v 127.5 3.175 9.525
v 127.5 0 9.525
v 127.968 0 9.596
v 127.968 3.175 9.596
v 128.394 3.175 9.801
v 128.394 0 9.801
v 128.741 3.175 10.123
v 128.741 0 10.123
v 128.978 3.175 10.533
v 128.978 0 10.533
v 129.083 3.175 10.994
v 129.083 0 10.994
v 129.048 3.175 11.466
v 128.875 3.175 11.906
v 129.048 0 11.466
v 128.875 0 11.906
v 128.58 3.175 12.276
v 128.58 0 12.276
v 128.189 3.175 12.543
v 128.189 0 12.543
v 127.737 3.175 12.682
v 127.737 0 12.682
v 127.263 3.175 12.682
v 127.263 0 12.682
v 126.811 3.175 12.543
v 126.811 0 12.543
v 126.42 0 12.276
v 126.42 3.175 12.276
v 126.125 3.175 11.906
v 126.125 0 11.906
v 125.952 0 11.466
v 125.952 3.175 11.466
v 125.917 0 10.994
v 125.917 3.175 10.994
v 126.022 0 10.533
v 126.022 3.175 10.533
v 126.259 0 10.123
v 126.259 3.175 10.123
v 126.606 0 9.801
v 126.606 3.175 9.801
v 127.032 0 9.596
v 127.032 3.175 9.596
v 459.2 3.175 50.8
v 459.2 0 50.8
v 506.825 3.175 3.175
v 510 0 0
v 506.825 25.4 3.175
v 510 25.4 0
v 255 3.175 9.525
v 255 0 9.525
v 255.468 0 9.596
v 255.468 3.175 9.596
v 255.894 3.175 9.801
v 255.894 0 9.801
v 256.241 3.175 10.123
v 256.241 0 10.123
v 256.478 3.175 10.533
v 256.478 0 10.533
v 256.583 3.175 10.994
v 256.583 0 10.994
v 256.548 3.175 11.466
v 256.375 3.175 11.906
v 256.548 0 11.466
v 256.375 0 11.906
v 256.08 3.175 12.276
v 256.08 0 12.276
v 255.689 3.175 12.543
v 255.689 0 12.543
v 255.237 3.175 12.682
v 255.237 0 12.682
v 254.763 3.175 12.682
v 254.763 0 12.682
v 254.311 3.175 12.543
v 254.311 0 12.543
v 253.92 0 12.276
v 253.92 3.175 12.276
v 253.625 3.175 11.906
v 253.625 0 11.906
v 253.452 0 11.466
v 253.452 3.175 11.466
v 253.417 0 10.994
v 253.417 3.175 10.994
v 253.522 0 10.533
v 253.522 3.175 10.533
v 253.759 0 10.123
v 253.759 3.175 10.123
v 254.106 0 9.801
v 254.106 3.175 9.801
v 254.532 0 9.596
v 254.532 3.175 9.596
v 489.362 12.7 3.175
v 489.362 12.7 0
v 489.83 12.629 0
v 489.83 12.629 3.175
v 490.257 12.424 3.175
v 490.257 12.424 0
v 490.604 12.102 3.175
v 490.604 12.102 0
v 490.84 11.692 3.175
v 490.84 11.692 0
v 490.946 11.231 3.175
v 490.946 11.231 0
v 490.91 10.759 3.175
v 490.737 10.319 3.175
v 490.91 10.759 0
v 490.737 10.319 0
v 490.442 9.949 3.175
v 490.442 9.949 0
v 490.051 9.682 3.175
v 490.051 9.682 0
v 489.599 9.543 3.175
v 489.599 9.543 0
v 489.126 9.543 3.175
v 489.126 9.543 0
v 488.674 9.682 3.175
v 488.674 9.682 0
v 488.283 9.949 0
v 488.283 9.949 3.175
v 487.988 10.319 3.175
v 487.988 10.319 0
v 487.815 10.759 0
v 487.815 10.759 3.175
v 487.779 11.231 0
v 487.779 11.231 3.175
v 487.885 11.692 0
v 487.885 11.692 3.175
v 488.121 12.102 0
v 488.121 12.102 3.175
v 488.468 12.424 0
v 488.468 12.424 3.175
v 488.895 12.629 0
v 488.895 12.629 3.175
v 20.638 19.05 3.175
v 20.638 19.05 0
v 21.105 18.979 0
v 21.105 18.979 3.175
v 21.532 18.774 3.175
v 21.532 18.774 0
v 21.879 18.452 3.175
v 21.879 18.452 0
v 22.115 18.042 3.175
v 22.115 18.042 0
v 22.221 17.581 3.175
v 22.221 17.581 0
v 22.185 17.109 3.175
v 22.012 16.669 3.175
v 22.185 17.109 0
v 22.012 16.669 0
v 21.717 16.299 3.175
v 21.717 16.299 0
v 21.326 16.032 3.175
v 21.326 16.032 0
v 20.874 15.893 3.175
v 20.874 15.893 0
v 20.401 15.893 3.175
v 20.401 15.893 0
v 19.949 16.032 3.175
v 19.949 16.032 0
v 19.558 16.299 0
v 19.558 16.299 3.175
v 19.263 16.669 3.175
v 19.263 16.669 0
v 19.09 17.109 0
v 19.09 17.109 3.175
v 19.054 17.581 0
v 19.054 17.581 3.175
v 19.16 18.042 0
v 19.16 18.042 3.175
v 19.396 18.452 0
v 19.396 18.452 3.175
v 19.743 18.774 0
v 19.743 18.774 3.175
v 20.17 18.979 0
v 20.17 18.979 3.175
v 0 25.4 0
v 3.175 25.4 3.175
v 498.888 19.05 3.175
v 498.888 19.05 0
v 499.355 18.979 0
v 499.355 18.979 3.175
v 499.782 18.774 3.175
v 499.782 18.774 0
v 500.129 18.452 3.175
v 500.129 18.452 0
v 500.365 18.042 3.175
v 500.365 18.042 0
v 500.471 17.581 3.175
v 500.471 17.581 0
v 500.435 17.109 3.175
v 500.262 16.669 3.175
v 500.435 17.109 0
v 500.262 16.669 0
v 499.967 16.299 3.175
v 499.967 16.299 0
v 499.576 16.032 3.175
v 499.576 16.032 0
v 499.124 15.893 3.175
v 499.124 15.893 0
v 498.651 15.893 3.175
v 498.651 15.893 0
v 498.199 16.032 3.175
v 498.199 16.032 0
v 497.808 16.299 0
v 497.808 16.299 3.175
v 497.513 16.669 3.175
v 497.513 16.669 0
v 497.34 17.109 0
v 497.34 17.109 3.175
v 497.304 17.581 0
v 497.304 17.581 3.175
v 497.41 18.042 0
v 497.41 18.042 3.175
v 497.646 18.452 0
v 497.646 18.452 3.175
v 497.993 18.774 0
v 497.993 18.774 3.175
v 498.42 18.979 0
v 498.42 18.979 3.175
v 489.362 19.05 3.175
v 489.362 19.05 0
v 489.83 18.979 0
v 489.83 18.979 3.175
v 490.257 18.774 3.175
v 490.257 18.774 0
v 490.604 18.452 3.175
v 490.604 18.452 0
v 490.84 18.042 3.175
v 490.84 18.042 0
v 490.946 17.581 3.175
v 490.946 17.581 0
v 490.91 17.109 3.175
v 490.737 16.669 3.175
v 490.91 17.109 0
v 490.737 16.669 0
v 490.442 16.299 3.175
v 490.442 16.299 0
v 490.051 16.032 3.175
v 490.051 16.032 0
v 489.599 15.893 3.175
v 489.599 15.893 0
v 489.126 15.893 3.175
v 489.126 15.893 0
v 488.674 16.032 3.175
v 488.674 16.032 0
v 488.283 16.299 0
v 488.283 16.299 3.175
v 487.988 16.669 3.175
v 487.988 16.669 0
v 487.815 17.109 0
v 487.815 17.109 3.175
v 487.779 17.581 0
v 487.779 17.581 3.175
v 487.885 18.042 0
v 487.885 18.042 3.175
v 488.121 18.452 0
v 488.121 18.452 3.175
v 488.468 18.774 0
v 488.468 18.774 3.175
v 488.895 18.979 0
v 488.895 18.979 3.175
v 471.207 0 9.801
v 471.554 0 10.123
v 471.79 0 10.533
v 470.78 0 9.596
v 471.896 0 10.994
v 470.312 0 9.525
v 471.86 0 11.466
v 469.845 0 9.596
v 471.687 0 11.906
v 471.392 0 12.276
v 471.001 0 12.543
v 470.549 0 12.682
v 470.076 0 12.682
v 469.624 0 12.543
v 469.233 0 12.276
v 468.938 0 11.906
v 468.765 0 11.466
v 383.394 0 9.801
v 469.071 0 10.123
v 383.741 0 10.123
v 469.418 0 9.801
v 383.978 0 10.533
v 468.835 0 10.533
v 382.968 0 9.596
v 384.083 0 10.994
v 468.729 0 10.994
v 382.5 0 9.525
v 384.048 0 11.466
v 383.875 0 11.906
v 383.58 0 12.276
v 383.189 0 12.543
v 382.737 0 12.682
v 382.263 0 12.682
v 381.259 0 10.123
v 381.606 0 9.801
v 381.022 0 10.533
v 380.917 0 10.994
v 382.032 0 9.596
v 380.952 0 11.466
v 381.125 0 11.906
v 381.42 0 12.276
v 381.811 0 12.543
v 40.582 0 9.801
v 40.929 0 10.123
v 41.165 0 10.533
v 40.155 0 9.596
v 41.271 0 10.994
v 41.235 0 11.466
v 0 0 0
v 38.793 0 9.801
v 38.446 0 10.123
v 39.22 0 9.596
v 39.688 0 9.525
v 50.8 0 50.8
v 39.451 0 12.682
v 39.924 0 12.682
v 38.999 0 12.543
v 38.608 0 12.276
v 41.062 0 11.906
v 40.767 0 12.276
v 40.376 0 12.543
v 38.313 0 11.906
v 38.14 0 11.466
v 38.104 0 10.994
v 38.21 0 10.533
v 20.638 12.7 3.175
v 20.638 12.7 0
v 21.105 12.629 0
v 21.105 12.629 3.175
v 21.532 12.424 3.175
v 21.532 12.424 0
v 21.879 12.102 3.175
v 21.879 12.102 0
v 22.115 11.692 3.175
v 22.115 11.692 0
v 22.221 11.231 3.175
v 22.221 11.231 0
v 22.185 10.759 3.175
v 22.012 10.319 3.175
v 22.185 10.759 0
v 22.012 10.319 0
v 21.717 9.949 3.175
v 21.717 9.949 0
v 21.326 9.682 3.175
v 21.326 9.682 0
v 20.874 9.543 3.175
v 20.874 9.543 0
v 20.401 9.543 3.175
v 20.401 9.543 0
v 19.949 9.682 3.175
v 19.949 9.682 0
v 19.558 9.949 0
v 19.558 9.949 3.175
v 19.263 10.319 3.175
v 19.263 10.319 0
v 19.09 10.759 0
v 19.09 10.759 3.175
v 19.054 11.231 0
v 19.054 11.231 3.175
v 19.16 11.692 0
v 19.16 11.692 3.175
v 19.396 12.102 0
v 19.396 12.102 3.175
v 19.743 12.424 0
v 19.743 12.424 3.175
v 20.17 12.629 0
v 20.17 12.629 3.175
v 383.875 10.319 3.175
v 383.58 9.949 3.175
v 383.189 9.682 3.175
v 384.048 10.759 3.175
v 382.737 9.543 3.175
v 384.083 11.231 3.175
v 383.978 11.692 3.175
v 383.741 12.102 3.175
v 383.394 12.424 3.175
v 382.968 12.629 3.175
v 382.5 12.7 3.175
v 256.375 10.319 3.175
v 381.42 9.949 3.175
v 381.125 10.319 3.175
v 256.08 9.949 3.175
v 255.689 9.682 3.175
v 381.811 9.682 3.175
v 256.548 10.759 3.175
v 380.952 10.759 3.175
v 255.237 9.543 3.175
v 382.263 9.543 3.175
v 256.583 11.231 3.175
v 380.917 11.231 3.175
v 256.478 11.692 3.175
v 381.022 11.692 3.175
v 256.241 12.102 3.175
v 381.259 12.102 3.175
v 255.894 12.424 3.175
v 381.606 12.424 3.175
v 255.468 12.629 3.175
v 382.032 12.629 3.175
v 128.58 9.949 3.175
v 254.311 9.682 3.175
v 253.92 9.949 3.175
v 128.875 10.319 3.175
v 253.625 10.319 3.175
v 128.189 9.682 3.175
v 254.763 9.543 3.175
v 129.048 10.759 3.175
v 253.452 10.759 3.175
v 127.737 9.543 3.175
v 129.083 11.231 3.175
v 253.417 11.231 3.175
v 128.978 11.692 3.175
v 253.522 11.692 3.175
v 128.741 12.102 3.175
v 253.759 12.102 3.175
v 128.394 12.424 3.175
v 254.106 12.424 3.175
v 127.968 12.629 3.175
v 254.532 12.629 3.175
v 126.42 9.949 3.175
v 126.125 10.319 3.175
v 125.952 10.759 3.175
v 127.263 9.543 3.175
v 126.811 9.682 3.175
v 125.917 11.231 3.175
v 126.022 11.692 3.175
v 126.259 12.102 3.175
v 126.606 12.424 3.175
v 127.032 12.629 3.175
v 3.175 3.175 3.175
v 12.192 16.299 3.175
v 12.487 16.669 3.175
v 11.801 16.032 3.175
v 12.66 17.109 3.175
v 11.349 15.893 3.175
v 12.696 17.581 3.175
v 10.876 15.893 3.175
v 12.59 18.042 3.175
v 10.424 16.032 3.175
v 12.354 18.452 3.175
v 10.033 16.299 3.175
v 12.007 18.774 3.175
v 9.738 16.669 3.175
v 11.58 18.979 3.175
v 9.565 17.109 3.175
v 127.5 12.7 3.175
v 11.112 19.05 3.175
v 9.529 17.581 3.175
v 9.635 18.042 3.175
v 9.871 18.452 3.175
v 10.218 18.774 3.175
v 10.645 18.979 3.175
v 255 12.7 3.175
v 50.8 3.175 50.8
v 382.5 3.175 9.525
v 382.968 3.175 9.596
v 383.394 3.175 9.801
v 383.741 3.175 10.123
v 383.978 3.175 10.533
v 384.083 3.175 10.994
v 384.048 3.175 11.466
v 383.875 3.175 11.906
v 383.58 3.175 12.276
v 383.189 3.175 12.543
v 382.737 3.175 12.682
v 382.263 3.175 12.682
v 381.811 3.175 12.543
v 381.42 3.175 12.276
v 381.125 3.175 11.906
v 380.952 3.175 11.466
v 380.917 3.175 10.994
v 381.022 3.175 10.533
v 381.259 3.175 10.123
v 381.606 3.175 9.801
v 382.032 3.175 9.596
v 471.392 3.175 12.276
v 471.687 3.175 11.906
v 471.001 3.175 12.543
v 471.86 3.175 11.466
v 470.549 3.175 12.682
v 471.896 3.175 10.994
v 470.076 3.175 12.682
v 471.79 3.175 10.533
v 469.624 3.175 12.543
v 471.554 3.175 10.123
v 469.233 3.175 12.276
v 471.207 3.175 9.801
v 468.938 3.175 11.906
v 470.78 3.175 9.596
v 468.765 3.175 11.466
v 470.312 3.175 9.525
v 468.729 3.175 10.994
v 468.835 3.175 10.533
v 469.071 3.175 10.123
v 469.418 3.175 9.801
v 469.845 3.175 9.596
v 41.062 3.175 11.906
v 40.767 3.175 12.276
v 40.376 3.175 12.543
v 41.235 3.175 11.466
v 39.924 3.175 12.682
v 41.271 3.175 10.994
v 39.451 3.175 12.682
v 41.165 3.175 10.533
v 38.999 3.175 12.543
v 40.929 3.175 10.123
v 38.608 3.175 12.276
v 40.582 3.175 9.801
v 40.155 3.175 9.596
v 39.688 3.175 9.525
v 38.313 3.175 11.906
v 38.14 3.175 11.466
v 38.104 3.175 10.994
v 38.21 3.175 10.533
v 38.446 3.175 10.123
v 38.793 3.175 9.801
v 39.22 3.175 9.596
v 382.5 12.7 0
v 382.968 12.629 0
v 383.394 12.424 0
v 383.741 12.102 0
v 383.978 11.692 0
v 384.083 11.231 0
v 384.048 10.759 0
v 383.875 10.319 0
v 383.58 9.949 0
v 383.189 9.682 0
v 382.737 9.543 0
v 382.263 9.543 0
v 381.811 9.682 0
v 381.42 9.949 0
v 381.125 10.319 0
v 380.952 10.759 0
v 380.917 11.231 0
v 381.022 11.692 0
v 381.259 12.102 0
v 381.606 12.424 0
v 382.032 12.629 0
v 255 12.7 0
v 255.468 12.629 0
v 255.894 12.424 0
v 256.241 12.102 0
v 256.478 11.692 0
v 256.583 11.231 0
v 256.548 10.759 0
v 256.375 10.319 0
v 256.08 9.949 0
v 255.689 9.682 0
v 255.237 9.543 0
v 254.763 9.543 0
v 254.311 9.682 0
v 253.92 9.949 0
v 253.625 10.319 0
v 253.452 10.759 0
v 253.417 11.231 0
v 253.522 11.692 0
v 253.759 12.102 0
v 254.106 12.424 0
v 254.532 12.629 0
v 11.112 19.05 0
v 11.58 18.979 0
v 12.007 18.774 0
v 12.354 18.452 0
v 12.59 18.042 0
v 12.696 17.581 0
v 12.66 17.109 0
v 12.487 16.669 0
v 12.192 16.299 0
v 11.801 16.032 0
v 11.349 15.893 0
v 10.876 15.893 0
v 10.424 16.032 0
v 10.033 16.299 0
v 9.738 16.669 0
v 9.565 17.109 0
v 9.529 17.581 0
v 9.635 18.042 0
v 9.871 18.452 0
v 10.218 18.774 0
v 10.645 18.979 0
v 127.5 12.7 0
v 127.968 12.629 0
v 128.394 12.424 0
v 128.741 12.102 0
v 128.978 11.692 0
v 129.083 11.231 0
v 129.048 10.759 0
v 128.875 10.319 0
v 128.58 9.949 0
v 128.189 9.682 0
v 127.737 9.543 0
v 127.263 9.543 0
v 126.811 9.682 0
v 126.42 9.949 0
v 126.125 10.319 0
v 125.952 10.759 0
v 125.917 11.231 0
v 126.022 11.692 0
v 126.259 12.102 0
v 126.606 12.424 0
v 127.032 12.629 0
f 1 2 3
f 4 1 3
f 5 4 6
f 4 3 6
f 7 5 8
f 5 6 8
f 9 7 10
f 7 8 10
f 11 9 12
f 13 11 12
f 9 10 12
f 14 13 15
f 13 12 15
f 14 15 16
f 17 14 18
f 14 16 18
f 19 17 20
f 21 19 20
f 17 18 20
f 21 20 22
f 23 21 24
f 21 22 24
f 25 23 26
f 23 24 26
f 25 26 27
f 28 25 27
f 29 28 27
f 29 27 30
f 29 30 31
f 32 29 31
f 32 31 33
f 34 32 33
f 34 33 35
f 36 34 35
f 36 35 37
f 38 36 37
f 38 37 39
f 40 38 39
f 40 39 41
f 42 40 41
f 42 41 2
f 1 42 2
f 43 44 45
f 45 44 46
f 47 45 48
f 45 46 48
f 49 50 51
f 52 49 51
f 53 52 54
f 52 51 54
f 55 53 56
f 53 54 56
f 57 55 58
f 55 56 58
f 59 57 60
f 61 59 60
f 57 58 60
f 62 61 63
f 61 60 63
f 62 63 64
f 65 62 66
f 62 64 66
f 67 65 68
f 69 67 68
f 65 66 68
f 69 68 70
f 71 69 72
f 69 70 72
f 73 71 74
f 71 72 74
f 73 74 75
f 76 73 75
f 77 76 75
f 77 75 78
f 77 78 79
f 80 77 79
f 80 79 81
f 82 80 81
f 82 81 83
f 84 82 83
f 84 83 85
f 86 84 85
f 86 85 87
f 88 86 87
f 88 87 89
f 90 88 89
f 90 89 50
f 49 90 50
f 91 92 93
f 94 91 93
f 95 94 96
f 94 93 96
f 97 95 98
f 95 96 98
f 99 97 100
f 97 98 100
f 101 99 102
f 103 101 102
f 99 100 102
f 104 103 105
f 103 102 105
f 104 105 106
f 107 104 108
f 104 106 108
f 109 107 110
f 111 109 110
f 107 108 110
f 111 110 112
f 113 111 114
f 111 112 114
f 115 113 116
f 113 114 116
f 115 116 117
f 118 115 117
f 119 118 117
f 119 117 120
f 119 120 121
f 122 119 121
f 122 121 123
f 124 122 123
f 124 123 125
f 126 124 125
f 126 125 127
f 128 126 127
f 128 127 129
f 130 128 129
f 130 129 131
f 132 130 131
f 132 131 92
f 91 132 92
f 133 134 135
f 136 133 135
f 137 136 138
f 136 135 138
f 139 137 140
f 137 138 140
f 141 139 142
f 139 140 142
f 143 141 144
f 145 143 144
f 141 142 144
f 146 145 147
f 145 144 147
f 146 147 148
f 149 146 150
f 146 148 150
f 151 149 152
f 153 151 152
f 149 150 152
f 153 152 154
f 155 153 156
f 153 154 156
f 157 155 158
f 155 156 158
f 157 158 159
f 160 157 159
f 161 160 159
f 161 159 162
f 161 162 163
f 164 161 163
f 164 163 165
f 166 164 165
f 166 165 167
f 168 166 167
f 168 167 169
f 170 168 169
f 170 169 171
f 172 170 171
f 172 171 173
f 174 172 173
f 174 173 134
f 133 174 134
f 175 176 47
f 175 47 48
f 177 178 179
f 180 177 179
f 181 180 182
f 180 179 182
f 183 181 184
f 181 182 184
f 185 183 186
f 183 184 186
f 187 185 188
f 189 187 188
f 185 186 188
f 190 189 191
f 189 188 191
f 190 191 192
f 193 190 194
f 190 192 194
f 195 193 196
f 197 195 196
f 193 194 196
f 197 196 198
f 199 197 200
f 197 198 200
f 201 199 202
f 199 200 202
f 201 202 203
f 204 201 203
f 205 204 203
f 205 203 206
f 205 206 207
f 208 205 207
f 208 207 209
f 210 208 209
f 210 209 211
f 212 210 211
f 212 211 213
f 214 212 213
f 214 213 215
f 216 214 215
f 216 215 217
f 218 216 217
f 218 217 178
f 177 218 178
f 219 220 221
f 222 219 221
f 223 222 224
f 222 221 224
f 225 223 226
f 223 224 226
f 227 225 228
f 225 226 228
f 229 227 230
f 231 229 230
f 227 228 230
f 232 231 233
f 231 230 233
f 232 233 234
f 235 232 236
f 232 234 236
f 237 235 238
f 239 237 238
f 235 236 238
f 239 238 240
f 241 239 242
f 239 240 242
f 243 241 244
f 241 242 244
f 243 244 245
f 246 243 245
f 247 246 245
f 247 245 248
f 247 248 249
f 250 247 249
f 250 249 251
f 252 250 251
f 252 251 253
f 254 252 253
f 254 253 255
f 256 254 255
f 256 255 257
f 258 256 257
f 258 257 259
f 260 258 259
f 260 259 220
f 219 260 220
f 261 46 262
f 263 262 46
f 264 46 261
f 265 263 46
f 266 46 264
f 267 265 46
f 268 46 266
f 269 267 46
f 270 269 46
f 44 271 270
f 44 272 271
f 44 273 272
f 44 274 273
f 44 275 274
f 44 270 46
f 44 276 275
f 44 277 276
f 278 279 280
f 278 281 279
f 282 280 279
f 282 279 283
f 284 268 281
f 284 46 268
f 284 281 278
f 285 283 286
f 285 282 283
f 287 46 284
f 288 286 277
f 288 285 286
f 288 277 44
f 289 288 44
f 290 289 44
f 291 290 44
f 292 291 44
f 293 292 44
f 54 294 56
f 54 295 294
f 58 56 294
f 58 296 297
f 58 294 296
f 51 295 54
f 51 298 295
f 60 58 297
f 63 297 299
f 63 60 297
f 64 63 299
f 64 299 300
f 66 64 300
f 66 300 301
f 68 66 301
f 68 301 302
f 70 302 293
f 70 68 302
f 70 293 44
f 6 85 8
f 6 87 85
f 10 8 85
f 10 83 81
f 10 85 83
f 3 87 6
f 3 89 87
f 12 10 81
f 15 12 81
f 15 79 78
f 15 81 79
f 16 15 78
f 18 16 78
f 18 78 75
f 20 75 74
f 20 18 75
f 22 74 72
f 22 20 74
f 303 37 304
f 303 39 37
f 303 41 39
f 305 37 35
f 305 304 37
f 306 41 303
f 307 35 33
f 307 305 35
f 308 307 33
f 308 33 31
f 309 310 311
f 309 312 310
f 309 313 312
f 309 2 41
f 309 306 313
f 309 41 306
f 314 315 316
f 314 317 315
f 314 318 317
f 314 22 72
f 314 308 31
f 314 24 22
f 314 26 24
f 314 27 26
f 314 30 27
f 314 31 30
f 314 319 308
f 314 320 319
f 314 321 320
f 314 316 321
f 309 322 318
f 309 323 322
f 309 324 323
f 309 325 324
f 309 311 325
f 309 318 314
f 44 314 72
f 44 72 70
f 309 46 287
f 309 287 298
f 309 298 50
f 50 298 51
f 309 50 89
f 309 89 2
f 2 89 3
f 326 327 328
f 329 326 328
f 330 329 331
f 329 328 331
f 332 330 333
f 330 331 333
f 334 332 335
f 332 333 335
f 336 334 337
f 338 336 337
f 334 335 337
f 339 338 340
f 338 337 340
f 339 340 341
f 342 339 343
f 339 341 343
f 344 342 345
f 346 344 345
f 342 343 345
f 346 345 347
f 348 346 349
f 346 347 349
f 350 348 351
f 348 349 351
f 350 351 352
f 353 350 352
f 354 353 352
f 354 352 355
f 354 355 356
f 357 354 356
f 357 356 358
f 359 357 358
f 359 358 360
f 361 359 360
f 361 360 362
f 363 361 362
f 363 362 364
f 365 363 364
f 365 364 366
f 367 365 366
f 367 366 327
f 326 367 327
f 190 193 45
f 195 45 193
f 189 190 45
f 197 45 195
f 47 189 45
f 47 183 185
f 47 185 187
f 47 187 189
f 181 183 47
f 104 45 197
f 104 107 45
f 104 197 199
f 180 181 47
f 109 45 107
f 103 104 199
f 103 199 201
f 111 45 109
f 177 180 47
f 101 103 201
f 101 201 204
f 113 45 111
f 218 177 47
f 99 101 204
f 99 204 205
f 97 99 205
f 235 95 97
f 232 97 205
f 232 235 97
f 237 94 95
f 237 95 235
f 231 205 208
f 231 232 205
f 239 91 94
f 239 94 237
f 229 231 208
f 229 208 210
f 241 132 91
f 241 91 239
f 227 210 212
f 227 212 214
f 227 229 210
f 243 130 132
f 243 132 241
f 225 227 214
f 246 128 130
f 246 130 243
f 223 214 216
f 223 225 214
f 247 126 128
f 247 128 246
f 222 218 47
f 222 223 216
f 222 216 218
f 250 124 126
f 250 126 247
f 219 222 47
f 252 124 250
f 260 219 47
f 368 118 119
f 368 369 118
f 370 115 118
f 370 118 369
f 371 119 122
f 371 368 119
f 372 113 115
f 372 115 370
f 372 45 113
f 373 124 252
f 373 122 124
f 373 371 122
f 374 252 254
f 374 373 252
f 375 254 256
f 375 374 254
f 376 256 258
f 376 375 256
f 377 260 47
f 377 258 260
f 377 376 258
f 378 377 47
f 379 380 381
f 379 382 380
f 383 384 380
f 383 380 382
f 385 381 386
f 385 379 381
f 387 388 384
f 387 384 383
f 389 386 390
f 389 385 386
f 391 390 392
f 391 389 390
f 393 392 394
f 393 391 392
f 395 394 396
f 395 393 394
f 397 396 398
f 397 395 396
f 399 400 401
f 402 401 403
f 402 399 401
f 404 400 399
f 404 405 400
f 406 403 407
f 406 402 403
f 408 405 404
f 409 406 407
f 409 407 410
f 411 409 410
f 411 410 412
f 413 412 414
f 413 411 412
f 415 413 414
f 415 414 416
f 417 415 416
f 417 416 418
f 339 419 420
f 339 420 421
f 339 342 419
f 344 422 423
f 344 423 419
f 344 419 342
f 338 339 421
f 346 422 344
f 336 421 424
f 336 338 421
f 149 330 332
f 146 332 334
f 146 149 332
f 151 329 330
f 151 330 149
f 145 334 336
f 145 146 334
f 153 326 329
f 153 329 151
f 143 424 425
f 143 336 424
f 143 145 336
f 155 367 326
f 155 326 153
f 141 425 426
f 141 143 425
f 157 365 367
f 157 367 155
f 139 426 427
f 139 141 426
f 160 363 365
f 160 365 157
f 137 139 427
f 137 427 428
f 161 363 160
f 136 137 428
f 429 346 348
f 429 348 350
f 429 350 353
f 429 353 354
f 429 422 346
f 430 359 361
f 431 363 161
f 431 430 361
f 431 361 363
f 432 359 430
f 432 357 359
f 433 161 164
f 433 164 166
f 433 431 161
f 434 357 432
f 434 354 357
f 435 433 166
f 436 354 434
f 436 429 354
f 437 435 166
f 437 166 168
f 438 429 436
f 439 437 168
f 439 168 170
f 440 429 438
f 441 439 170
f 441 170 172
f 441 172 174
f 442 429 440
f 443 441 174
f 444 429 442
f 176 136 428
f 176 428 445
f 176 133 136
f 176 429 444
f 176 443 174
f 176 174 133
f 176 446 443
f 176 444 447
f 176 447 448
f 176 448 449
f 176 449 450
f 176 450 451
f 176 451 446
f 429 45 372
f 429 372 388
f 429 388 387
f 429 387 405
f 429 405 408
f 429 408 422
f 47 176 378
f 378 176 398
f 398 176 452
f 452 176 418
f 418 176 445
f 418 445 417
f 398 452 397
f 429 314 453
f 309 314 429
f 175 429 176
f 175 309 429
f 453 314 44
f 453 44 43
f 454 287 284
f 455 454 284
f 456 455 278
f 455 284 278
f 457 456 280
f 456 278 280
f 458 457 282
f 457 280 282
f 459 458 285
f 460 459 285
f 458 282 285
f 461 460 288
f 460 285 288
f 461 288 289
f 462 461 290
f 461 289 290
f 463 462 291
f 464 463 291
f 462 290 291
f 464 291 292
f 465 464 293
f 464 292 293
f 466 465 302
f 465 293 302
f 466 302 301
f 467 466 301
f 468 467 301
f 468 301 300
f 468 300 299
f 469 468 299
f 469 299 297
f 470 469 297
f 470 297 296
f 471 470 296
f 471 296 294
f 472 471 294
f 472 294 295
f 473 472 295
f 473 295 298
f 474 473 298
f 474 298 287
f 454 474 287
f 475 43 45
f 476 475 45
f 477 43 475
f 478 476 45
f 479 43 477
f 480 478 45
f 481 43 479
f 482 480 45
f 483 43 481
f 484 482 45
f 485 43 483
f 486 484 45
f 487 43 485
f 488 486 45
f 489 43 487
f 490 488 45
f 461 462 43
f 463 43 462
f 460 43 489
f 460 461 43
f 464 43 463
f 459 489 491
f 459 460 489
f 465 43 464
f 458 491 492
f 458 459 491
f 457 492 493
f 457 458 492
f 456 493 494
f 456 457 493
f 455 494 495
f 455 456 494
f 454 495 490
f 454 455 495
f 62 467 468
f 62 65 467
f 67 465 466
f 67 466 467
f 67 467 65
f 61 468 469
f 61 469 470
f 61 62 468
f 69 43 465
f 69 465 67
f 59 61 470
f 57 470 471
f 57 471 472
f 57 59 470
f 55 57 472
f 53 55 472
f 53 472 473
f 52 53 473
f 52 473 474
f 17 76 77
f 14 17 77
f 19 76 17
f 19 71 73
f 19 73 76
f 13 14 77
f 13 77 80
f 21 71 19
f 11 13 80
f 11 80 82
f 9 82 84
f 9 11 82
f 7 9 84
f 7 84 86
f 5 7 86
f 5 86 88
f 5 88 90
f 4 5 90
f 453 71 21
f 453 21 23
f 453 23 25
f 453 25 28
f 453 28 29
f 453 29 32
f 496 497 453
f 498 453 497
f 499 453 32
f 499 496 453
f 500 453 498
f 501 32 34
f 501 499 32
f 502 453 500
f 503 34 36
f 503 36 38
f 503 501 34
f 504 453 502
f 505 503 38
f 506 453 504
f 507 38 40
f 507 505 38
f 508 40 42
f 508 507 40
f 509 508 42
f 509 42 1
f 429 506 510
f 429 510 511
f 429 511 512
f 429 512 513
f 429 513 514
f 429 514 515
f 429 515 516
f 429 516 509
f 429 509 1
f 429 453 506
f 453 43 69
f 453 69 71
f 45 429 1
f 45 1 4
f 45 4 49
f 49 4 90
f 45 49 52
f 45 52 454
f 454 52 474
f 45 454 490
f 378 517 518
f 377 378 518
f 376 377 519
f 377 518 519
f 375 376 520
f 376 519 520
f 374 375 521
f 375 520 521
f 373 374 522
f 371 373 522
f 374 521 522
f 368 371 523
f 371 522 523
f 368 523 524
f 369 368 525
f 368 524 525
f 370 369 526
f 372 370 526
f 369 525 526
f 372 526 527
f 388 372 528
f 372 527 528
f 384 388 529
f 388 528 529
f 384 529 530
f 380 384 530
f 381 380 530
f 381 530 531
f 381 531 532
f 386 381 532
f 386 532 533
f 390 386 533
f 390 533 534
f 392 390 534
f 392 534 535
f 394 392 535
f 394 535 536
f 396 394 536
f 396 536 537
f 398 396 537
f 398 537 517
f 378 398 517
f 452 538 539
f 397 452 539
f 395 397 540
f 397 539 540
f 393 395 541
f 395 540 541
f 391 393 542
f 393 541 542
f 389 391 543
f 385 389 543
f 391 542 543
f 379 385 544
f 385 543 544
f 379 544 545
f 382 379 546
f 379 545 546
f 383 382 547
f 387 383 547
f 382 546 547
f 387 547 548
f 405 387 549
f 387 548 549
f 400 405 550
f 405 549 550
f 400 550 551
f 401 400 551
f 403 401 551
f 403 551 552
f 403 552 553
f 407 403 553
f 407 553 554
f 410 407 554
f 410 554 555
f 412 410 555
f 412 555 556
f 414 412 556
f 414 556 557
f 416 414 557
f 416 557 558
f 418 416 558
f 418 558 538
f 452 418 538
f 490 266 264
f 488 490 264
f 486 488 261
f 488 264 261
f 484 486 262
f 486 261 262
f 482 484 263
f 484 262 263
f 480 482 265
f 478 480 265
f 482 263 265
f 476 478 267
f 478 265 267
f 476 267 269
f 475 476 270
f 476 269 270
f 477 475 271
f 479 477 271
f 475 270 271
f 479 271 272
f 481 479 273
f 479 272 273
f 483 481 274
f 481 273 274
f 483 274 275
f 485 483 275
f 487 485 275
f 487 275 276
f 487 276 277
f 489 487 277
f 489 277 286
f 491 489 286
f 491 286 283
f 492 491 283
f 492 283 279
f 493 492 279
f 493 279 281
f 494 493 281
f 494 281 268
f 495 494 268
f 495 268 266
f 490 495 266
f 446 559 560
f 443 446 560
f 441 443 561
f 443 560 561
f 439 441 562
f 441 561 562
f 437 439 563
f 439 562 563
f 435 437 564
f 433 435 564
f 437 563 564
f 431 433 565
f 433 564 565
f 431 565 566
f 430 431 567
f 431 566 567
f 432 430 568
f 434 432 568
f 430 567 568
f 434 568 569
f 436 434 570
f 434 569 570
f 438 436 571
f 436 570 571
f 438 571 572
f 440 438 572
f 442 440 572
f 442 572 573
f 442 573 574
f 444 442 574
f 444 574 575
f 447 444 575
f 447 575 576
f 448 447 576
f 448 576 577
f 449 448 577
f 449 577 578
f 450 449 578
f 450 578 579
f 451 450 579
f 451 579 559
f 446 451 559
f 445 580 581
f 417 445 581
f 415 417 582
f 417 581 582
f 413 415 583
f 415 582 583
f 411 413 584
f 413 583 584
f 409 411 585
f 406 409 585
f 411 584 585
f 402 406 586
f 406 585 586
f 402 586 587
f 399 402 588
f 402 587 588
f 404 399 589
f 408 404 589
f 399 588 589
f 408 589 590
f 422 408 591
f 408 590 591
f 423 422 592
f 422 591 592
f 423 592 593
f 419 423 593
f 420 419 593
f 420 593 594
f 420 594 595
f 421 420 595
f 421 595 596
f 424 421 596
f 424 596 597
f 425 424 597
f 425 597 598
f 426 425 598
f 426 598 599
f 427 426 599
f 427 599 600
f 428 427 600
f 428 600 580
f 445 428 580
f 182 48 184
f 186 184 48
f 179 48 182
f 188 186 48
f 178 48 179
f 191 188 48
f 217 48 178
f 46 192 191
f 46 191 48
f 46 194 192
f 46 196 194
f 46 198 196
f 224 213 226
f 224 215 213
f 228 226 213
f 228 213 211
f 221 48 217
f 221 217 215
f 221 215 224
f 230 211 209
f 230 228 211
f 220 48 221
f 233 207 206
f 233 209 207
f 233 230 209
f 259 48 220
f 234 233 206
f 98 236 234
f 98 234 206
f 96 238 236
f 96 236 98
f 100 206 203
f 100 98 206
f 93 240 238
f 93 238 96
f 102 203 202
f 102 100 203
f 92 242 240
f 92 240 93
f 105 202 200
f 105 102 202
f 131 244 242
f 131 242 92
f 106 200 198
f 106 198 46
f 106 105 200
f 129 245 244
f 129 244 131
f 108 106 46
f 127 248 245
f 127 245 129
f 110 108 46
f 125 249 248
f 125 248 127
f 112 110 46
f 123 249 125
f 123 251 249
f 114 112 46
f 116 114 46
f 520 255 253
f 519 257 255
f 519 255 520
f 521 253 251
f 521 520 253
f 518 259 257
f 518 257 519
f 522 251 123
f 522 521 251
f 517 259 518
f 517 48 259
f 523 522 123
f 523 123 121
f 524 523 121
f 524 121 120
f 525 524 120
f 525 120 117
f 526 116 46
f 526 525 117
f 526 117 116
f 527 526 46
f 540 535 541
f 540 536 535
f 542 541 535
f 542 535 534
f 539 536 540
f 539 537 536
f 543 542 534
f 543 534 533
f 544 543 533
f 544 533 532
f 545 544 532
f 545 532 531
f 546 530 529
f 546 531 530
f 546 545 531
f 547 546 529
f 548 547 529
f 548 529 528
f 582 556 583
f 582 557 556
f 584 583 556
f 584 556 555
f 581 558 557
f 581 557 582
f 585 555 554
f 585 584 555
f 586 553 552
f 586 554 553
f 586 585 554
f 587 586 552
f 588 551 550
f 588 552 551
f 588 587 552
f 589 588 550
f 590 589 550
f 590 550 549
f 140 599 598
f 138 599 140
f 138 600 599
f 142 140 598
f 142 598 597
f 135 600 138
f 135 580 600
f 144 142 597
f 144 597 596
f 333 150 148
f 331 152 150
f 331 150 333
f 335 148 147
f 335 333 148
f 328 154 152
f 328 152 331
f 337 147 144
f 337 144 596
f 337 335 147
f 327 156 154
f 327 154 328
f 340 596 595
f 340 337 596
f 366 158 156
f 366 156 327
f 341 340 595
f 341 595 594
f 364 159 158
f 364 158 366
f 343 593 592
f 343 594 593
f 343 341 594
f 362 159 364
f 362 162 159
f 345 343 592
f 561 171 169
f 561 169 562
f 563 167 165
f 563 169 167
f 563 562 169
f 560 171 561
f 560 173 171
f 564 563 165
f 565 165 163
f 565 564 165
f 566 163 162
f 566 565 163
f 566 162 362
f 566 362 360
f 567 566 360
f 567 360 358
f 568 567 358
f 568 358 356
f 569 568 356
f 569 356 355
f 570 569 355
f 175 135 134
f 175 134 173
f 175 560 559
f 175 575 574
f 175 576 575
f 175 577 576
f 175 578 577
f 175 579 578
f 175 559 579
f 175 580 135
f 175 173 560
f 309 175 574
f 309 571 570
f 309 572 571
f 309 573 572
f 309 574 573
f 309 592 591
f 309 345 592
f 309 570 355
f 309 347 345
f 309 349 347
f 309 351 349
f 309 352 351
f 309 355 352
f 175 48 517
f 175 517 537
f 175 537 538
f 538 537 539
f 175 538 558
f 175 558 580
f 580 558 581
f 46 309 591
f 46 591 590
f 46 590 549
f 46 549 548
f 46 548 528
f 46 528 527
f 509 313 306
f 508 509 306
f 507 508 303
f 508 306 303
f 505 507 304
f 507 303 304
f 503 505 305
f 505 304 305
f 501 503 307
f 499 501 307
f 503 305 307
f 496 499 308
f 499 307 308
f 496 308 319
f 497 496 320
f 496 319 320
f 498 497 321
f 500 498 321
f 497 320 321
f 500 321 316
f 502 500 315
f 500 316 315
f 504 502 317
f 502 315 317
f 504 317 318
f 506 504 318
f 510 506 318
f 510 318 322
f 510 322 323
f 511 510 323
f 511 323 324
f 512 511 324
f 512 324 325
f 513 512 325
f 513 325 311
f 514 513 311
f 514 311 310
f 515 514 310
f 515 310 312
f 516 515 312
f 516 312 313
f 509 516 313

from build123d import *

# Parameters (mm, degrees)
BOSS_EXTRUDE1_DEPTH              = 510
CHAMFER6_SIZE                    = 50.8
CHAMFER7_SIZE                    = 50.8
BOTTOMHOLES_SKETCH3_R            = 1.5875
BOTTOMHOLES_CUT_EXTRUDE1_DEPTH   = 514.152803753
BACKSIDEHOLES_SKETCH2_R          = 1.5875
BACKSIDEHOLES_CUT_EXTRUDE2_DEPTH = 514.152803753


with BuildPart() as part:
    # Sketch1 → Boss-Extrude1 (new body)
    with BuildSketch(Plane(origin=(0, 0, 0), x_dir=(0, 0, -1), z_dir=(1, 0, 0))):
        Polygon((0, 0), (-50.8, 0), (-50.8, 3.175), (-3.175, 3.175), (-3.175, 25.4), (0, 25.4), align=None)
    extrude(amount=BOSS_EXTRUDE1_DEPTH)

    # Chamfer6
    chamfer6_edges = [part.edges().sort_by_distance(p)[0] for p in [
        (510, 1.5875, 50.8),
    ]]
    chamfer(chamfer6_edges, length=CHAMFER6_SIZE - 0.0001)  # a hair under: the kernel refuses the full size

    # Chamfer7
    chamfer7_edges = [part.edges().sort_by_distance(p)[0] for p in [
        (0, 1.5875, 50.8),
    ]]
    chamfer(chamfer7_edges, length=CHAMFER7_SIZE - 0.0001)  # a hair under: the kernel refuses the full size

    # BottomHoles-Sketch3 → BottomHoles-Cut-Extrude1 (cut, through all)
    with BuildSketch(Plane.XZ):
        with Locations(Location((39.6875, 11.1125, 0), (0, 0, 270))):
            Circle(BOTTOMHOLES_SKETCH3_R)
        with Locations(Location((470.3125, 11.1125, 0), (0, 0, 270))):
            Circle(BOTTOMHOLES_SKETCH3_R)
        with Locations(Location((127.5, 11.1125, 0), (0, 0, 270))):
            Circle(BOTTOMHOLES_SKETCH3_R)
        with Locations(Location((255, 11.1125, 0), (0, 0, 270))):
            Circle(BOTTOMHOLES_SKETCH3_R)
        with Locations(Location((382.5, 11.1125, 0), (0, 0, 270))):
            Circle(BOTTOMHOLES_SKETCH3_R)
    extrude(amount=-BOTTOMHOLES_CUT_EXTRUDE1_DEPTH, mode=Mode.SUBTRACT)

    # BackSideHoles-Sketch2 → BackSideHoles-Cut-Extrude2 (cut, through all)
    with BuildSketch(Plane(origin=(0, 0, 0), x_dir=(-1, 0, 0), z_dir=(0, 0, -1))):
        with Locations(Location((-498.8875, 17.4625, 0), (0, 0, 90))):
            Circle(BACKSIDEHOLES_SKETCH2_R)
        with Locations(Location((-489.3625, 17.4625, 0), (0, 0, 90))):
            Circle(BACKSIDEHOLES_SKETCH2_R)
        with Locations(Location((-20.6375, 17.4625, 0), (0, 0, 90))):
            Circle(BACKSIDEHOLES_SKETCH2_R)
        with Locations(Location((-11.1125, 17.4625, 0), (0, 0, 90))):
            Circle(BACKSIDEHOLES_SKETCH2_R)
        with Locations(Location((-20.6375, 11.1125, 0), (0, 0, 90))):
            Circle(BACKSIDEHOLES_SKETCH2_R)
        with Locations(Location((-489.3625, 11.1125, 0), (0, 0, 90))):
            Circle(BACKSIDEHOLES_SKETCH2_R)
        with Locations(Location((-382.5, 11.1125, 0), (0, 0, 90))):
            Circle(BACKSIDEHOLES_SKETCH2_R)
        with Locations(Location((-255, 11.1125, 0), (0, 0, 90))):
            Circle(BACKSIDEHOLES_SKETCH2_R)
        with Locations(Location((-127.5, 11.1125, 0), (0, 0, 90))):
            Circle(BACKSIDEHOLES_SKETCH2_R)
    extrude(amount=-BACKSIDEHOLES_CUT_EXTRUDE2_DEPTH, mode=Mode.SUBTRACT)


solid = part.part
